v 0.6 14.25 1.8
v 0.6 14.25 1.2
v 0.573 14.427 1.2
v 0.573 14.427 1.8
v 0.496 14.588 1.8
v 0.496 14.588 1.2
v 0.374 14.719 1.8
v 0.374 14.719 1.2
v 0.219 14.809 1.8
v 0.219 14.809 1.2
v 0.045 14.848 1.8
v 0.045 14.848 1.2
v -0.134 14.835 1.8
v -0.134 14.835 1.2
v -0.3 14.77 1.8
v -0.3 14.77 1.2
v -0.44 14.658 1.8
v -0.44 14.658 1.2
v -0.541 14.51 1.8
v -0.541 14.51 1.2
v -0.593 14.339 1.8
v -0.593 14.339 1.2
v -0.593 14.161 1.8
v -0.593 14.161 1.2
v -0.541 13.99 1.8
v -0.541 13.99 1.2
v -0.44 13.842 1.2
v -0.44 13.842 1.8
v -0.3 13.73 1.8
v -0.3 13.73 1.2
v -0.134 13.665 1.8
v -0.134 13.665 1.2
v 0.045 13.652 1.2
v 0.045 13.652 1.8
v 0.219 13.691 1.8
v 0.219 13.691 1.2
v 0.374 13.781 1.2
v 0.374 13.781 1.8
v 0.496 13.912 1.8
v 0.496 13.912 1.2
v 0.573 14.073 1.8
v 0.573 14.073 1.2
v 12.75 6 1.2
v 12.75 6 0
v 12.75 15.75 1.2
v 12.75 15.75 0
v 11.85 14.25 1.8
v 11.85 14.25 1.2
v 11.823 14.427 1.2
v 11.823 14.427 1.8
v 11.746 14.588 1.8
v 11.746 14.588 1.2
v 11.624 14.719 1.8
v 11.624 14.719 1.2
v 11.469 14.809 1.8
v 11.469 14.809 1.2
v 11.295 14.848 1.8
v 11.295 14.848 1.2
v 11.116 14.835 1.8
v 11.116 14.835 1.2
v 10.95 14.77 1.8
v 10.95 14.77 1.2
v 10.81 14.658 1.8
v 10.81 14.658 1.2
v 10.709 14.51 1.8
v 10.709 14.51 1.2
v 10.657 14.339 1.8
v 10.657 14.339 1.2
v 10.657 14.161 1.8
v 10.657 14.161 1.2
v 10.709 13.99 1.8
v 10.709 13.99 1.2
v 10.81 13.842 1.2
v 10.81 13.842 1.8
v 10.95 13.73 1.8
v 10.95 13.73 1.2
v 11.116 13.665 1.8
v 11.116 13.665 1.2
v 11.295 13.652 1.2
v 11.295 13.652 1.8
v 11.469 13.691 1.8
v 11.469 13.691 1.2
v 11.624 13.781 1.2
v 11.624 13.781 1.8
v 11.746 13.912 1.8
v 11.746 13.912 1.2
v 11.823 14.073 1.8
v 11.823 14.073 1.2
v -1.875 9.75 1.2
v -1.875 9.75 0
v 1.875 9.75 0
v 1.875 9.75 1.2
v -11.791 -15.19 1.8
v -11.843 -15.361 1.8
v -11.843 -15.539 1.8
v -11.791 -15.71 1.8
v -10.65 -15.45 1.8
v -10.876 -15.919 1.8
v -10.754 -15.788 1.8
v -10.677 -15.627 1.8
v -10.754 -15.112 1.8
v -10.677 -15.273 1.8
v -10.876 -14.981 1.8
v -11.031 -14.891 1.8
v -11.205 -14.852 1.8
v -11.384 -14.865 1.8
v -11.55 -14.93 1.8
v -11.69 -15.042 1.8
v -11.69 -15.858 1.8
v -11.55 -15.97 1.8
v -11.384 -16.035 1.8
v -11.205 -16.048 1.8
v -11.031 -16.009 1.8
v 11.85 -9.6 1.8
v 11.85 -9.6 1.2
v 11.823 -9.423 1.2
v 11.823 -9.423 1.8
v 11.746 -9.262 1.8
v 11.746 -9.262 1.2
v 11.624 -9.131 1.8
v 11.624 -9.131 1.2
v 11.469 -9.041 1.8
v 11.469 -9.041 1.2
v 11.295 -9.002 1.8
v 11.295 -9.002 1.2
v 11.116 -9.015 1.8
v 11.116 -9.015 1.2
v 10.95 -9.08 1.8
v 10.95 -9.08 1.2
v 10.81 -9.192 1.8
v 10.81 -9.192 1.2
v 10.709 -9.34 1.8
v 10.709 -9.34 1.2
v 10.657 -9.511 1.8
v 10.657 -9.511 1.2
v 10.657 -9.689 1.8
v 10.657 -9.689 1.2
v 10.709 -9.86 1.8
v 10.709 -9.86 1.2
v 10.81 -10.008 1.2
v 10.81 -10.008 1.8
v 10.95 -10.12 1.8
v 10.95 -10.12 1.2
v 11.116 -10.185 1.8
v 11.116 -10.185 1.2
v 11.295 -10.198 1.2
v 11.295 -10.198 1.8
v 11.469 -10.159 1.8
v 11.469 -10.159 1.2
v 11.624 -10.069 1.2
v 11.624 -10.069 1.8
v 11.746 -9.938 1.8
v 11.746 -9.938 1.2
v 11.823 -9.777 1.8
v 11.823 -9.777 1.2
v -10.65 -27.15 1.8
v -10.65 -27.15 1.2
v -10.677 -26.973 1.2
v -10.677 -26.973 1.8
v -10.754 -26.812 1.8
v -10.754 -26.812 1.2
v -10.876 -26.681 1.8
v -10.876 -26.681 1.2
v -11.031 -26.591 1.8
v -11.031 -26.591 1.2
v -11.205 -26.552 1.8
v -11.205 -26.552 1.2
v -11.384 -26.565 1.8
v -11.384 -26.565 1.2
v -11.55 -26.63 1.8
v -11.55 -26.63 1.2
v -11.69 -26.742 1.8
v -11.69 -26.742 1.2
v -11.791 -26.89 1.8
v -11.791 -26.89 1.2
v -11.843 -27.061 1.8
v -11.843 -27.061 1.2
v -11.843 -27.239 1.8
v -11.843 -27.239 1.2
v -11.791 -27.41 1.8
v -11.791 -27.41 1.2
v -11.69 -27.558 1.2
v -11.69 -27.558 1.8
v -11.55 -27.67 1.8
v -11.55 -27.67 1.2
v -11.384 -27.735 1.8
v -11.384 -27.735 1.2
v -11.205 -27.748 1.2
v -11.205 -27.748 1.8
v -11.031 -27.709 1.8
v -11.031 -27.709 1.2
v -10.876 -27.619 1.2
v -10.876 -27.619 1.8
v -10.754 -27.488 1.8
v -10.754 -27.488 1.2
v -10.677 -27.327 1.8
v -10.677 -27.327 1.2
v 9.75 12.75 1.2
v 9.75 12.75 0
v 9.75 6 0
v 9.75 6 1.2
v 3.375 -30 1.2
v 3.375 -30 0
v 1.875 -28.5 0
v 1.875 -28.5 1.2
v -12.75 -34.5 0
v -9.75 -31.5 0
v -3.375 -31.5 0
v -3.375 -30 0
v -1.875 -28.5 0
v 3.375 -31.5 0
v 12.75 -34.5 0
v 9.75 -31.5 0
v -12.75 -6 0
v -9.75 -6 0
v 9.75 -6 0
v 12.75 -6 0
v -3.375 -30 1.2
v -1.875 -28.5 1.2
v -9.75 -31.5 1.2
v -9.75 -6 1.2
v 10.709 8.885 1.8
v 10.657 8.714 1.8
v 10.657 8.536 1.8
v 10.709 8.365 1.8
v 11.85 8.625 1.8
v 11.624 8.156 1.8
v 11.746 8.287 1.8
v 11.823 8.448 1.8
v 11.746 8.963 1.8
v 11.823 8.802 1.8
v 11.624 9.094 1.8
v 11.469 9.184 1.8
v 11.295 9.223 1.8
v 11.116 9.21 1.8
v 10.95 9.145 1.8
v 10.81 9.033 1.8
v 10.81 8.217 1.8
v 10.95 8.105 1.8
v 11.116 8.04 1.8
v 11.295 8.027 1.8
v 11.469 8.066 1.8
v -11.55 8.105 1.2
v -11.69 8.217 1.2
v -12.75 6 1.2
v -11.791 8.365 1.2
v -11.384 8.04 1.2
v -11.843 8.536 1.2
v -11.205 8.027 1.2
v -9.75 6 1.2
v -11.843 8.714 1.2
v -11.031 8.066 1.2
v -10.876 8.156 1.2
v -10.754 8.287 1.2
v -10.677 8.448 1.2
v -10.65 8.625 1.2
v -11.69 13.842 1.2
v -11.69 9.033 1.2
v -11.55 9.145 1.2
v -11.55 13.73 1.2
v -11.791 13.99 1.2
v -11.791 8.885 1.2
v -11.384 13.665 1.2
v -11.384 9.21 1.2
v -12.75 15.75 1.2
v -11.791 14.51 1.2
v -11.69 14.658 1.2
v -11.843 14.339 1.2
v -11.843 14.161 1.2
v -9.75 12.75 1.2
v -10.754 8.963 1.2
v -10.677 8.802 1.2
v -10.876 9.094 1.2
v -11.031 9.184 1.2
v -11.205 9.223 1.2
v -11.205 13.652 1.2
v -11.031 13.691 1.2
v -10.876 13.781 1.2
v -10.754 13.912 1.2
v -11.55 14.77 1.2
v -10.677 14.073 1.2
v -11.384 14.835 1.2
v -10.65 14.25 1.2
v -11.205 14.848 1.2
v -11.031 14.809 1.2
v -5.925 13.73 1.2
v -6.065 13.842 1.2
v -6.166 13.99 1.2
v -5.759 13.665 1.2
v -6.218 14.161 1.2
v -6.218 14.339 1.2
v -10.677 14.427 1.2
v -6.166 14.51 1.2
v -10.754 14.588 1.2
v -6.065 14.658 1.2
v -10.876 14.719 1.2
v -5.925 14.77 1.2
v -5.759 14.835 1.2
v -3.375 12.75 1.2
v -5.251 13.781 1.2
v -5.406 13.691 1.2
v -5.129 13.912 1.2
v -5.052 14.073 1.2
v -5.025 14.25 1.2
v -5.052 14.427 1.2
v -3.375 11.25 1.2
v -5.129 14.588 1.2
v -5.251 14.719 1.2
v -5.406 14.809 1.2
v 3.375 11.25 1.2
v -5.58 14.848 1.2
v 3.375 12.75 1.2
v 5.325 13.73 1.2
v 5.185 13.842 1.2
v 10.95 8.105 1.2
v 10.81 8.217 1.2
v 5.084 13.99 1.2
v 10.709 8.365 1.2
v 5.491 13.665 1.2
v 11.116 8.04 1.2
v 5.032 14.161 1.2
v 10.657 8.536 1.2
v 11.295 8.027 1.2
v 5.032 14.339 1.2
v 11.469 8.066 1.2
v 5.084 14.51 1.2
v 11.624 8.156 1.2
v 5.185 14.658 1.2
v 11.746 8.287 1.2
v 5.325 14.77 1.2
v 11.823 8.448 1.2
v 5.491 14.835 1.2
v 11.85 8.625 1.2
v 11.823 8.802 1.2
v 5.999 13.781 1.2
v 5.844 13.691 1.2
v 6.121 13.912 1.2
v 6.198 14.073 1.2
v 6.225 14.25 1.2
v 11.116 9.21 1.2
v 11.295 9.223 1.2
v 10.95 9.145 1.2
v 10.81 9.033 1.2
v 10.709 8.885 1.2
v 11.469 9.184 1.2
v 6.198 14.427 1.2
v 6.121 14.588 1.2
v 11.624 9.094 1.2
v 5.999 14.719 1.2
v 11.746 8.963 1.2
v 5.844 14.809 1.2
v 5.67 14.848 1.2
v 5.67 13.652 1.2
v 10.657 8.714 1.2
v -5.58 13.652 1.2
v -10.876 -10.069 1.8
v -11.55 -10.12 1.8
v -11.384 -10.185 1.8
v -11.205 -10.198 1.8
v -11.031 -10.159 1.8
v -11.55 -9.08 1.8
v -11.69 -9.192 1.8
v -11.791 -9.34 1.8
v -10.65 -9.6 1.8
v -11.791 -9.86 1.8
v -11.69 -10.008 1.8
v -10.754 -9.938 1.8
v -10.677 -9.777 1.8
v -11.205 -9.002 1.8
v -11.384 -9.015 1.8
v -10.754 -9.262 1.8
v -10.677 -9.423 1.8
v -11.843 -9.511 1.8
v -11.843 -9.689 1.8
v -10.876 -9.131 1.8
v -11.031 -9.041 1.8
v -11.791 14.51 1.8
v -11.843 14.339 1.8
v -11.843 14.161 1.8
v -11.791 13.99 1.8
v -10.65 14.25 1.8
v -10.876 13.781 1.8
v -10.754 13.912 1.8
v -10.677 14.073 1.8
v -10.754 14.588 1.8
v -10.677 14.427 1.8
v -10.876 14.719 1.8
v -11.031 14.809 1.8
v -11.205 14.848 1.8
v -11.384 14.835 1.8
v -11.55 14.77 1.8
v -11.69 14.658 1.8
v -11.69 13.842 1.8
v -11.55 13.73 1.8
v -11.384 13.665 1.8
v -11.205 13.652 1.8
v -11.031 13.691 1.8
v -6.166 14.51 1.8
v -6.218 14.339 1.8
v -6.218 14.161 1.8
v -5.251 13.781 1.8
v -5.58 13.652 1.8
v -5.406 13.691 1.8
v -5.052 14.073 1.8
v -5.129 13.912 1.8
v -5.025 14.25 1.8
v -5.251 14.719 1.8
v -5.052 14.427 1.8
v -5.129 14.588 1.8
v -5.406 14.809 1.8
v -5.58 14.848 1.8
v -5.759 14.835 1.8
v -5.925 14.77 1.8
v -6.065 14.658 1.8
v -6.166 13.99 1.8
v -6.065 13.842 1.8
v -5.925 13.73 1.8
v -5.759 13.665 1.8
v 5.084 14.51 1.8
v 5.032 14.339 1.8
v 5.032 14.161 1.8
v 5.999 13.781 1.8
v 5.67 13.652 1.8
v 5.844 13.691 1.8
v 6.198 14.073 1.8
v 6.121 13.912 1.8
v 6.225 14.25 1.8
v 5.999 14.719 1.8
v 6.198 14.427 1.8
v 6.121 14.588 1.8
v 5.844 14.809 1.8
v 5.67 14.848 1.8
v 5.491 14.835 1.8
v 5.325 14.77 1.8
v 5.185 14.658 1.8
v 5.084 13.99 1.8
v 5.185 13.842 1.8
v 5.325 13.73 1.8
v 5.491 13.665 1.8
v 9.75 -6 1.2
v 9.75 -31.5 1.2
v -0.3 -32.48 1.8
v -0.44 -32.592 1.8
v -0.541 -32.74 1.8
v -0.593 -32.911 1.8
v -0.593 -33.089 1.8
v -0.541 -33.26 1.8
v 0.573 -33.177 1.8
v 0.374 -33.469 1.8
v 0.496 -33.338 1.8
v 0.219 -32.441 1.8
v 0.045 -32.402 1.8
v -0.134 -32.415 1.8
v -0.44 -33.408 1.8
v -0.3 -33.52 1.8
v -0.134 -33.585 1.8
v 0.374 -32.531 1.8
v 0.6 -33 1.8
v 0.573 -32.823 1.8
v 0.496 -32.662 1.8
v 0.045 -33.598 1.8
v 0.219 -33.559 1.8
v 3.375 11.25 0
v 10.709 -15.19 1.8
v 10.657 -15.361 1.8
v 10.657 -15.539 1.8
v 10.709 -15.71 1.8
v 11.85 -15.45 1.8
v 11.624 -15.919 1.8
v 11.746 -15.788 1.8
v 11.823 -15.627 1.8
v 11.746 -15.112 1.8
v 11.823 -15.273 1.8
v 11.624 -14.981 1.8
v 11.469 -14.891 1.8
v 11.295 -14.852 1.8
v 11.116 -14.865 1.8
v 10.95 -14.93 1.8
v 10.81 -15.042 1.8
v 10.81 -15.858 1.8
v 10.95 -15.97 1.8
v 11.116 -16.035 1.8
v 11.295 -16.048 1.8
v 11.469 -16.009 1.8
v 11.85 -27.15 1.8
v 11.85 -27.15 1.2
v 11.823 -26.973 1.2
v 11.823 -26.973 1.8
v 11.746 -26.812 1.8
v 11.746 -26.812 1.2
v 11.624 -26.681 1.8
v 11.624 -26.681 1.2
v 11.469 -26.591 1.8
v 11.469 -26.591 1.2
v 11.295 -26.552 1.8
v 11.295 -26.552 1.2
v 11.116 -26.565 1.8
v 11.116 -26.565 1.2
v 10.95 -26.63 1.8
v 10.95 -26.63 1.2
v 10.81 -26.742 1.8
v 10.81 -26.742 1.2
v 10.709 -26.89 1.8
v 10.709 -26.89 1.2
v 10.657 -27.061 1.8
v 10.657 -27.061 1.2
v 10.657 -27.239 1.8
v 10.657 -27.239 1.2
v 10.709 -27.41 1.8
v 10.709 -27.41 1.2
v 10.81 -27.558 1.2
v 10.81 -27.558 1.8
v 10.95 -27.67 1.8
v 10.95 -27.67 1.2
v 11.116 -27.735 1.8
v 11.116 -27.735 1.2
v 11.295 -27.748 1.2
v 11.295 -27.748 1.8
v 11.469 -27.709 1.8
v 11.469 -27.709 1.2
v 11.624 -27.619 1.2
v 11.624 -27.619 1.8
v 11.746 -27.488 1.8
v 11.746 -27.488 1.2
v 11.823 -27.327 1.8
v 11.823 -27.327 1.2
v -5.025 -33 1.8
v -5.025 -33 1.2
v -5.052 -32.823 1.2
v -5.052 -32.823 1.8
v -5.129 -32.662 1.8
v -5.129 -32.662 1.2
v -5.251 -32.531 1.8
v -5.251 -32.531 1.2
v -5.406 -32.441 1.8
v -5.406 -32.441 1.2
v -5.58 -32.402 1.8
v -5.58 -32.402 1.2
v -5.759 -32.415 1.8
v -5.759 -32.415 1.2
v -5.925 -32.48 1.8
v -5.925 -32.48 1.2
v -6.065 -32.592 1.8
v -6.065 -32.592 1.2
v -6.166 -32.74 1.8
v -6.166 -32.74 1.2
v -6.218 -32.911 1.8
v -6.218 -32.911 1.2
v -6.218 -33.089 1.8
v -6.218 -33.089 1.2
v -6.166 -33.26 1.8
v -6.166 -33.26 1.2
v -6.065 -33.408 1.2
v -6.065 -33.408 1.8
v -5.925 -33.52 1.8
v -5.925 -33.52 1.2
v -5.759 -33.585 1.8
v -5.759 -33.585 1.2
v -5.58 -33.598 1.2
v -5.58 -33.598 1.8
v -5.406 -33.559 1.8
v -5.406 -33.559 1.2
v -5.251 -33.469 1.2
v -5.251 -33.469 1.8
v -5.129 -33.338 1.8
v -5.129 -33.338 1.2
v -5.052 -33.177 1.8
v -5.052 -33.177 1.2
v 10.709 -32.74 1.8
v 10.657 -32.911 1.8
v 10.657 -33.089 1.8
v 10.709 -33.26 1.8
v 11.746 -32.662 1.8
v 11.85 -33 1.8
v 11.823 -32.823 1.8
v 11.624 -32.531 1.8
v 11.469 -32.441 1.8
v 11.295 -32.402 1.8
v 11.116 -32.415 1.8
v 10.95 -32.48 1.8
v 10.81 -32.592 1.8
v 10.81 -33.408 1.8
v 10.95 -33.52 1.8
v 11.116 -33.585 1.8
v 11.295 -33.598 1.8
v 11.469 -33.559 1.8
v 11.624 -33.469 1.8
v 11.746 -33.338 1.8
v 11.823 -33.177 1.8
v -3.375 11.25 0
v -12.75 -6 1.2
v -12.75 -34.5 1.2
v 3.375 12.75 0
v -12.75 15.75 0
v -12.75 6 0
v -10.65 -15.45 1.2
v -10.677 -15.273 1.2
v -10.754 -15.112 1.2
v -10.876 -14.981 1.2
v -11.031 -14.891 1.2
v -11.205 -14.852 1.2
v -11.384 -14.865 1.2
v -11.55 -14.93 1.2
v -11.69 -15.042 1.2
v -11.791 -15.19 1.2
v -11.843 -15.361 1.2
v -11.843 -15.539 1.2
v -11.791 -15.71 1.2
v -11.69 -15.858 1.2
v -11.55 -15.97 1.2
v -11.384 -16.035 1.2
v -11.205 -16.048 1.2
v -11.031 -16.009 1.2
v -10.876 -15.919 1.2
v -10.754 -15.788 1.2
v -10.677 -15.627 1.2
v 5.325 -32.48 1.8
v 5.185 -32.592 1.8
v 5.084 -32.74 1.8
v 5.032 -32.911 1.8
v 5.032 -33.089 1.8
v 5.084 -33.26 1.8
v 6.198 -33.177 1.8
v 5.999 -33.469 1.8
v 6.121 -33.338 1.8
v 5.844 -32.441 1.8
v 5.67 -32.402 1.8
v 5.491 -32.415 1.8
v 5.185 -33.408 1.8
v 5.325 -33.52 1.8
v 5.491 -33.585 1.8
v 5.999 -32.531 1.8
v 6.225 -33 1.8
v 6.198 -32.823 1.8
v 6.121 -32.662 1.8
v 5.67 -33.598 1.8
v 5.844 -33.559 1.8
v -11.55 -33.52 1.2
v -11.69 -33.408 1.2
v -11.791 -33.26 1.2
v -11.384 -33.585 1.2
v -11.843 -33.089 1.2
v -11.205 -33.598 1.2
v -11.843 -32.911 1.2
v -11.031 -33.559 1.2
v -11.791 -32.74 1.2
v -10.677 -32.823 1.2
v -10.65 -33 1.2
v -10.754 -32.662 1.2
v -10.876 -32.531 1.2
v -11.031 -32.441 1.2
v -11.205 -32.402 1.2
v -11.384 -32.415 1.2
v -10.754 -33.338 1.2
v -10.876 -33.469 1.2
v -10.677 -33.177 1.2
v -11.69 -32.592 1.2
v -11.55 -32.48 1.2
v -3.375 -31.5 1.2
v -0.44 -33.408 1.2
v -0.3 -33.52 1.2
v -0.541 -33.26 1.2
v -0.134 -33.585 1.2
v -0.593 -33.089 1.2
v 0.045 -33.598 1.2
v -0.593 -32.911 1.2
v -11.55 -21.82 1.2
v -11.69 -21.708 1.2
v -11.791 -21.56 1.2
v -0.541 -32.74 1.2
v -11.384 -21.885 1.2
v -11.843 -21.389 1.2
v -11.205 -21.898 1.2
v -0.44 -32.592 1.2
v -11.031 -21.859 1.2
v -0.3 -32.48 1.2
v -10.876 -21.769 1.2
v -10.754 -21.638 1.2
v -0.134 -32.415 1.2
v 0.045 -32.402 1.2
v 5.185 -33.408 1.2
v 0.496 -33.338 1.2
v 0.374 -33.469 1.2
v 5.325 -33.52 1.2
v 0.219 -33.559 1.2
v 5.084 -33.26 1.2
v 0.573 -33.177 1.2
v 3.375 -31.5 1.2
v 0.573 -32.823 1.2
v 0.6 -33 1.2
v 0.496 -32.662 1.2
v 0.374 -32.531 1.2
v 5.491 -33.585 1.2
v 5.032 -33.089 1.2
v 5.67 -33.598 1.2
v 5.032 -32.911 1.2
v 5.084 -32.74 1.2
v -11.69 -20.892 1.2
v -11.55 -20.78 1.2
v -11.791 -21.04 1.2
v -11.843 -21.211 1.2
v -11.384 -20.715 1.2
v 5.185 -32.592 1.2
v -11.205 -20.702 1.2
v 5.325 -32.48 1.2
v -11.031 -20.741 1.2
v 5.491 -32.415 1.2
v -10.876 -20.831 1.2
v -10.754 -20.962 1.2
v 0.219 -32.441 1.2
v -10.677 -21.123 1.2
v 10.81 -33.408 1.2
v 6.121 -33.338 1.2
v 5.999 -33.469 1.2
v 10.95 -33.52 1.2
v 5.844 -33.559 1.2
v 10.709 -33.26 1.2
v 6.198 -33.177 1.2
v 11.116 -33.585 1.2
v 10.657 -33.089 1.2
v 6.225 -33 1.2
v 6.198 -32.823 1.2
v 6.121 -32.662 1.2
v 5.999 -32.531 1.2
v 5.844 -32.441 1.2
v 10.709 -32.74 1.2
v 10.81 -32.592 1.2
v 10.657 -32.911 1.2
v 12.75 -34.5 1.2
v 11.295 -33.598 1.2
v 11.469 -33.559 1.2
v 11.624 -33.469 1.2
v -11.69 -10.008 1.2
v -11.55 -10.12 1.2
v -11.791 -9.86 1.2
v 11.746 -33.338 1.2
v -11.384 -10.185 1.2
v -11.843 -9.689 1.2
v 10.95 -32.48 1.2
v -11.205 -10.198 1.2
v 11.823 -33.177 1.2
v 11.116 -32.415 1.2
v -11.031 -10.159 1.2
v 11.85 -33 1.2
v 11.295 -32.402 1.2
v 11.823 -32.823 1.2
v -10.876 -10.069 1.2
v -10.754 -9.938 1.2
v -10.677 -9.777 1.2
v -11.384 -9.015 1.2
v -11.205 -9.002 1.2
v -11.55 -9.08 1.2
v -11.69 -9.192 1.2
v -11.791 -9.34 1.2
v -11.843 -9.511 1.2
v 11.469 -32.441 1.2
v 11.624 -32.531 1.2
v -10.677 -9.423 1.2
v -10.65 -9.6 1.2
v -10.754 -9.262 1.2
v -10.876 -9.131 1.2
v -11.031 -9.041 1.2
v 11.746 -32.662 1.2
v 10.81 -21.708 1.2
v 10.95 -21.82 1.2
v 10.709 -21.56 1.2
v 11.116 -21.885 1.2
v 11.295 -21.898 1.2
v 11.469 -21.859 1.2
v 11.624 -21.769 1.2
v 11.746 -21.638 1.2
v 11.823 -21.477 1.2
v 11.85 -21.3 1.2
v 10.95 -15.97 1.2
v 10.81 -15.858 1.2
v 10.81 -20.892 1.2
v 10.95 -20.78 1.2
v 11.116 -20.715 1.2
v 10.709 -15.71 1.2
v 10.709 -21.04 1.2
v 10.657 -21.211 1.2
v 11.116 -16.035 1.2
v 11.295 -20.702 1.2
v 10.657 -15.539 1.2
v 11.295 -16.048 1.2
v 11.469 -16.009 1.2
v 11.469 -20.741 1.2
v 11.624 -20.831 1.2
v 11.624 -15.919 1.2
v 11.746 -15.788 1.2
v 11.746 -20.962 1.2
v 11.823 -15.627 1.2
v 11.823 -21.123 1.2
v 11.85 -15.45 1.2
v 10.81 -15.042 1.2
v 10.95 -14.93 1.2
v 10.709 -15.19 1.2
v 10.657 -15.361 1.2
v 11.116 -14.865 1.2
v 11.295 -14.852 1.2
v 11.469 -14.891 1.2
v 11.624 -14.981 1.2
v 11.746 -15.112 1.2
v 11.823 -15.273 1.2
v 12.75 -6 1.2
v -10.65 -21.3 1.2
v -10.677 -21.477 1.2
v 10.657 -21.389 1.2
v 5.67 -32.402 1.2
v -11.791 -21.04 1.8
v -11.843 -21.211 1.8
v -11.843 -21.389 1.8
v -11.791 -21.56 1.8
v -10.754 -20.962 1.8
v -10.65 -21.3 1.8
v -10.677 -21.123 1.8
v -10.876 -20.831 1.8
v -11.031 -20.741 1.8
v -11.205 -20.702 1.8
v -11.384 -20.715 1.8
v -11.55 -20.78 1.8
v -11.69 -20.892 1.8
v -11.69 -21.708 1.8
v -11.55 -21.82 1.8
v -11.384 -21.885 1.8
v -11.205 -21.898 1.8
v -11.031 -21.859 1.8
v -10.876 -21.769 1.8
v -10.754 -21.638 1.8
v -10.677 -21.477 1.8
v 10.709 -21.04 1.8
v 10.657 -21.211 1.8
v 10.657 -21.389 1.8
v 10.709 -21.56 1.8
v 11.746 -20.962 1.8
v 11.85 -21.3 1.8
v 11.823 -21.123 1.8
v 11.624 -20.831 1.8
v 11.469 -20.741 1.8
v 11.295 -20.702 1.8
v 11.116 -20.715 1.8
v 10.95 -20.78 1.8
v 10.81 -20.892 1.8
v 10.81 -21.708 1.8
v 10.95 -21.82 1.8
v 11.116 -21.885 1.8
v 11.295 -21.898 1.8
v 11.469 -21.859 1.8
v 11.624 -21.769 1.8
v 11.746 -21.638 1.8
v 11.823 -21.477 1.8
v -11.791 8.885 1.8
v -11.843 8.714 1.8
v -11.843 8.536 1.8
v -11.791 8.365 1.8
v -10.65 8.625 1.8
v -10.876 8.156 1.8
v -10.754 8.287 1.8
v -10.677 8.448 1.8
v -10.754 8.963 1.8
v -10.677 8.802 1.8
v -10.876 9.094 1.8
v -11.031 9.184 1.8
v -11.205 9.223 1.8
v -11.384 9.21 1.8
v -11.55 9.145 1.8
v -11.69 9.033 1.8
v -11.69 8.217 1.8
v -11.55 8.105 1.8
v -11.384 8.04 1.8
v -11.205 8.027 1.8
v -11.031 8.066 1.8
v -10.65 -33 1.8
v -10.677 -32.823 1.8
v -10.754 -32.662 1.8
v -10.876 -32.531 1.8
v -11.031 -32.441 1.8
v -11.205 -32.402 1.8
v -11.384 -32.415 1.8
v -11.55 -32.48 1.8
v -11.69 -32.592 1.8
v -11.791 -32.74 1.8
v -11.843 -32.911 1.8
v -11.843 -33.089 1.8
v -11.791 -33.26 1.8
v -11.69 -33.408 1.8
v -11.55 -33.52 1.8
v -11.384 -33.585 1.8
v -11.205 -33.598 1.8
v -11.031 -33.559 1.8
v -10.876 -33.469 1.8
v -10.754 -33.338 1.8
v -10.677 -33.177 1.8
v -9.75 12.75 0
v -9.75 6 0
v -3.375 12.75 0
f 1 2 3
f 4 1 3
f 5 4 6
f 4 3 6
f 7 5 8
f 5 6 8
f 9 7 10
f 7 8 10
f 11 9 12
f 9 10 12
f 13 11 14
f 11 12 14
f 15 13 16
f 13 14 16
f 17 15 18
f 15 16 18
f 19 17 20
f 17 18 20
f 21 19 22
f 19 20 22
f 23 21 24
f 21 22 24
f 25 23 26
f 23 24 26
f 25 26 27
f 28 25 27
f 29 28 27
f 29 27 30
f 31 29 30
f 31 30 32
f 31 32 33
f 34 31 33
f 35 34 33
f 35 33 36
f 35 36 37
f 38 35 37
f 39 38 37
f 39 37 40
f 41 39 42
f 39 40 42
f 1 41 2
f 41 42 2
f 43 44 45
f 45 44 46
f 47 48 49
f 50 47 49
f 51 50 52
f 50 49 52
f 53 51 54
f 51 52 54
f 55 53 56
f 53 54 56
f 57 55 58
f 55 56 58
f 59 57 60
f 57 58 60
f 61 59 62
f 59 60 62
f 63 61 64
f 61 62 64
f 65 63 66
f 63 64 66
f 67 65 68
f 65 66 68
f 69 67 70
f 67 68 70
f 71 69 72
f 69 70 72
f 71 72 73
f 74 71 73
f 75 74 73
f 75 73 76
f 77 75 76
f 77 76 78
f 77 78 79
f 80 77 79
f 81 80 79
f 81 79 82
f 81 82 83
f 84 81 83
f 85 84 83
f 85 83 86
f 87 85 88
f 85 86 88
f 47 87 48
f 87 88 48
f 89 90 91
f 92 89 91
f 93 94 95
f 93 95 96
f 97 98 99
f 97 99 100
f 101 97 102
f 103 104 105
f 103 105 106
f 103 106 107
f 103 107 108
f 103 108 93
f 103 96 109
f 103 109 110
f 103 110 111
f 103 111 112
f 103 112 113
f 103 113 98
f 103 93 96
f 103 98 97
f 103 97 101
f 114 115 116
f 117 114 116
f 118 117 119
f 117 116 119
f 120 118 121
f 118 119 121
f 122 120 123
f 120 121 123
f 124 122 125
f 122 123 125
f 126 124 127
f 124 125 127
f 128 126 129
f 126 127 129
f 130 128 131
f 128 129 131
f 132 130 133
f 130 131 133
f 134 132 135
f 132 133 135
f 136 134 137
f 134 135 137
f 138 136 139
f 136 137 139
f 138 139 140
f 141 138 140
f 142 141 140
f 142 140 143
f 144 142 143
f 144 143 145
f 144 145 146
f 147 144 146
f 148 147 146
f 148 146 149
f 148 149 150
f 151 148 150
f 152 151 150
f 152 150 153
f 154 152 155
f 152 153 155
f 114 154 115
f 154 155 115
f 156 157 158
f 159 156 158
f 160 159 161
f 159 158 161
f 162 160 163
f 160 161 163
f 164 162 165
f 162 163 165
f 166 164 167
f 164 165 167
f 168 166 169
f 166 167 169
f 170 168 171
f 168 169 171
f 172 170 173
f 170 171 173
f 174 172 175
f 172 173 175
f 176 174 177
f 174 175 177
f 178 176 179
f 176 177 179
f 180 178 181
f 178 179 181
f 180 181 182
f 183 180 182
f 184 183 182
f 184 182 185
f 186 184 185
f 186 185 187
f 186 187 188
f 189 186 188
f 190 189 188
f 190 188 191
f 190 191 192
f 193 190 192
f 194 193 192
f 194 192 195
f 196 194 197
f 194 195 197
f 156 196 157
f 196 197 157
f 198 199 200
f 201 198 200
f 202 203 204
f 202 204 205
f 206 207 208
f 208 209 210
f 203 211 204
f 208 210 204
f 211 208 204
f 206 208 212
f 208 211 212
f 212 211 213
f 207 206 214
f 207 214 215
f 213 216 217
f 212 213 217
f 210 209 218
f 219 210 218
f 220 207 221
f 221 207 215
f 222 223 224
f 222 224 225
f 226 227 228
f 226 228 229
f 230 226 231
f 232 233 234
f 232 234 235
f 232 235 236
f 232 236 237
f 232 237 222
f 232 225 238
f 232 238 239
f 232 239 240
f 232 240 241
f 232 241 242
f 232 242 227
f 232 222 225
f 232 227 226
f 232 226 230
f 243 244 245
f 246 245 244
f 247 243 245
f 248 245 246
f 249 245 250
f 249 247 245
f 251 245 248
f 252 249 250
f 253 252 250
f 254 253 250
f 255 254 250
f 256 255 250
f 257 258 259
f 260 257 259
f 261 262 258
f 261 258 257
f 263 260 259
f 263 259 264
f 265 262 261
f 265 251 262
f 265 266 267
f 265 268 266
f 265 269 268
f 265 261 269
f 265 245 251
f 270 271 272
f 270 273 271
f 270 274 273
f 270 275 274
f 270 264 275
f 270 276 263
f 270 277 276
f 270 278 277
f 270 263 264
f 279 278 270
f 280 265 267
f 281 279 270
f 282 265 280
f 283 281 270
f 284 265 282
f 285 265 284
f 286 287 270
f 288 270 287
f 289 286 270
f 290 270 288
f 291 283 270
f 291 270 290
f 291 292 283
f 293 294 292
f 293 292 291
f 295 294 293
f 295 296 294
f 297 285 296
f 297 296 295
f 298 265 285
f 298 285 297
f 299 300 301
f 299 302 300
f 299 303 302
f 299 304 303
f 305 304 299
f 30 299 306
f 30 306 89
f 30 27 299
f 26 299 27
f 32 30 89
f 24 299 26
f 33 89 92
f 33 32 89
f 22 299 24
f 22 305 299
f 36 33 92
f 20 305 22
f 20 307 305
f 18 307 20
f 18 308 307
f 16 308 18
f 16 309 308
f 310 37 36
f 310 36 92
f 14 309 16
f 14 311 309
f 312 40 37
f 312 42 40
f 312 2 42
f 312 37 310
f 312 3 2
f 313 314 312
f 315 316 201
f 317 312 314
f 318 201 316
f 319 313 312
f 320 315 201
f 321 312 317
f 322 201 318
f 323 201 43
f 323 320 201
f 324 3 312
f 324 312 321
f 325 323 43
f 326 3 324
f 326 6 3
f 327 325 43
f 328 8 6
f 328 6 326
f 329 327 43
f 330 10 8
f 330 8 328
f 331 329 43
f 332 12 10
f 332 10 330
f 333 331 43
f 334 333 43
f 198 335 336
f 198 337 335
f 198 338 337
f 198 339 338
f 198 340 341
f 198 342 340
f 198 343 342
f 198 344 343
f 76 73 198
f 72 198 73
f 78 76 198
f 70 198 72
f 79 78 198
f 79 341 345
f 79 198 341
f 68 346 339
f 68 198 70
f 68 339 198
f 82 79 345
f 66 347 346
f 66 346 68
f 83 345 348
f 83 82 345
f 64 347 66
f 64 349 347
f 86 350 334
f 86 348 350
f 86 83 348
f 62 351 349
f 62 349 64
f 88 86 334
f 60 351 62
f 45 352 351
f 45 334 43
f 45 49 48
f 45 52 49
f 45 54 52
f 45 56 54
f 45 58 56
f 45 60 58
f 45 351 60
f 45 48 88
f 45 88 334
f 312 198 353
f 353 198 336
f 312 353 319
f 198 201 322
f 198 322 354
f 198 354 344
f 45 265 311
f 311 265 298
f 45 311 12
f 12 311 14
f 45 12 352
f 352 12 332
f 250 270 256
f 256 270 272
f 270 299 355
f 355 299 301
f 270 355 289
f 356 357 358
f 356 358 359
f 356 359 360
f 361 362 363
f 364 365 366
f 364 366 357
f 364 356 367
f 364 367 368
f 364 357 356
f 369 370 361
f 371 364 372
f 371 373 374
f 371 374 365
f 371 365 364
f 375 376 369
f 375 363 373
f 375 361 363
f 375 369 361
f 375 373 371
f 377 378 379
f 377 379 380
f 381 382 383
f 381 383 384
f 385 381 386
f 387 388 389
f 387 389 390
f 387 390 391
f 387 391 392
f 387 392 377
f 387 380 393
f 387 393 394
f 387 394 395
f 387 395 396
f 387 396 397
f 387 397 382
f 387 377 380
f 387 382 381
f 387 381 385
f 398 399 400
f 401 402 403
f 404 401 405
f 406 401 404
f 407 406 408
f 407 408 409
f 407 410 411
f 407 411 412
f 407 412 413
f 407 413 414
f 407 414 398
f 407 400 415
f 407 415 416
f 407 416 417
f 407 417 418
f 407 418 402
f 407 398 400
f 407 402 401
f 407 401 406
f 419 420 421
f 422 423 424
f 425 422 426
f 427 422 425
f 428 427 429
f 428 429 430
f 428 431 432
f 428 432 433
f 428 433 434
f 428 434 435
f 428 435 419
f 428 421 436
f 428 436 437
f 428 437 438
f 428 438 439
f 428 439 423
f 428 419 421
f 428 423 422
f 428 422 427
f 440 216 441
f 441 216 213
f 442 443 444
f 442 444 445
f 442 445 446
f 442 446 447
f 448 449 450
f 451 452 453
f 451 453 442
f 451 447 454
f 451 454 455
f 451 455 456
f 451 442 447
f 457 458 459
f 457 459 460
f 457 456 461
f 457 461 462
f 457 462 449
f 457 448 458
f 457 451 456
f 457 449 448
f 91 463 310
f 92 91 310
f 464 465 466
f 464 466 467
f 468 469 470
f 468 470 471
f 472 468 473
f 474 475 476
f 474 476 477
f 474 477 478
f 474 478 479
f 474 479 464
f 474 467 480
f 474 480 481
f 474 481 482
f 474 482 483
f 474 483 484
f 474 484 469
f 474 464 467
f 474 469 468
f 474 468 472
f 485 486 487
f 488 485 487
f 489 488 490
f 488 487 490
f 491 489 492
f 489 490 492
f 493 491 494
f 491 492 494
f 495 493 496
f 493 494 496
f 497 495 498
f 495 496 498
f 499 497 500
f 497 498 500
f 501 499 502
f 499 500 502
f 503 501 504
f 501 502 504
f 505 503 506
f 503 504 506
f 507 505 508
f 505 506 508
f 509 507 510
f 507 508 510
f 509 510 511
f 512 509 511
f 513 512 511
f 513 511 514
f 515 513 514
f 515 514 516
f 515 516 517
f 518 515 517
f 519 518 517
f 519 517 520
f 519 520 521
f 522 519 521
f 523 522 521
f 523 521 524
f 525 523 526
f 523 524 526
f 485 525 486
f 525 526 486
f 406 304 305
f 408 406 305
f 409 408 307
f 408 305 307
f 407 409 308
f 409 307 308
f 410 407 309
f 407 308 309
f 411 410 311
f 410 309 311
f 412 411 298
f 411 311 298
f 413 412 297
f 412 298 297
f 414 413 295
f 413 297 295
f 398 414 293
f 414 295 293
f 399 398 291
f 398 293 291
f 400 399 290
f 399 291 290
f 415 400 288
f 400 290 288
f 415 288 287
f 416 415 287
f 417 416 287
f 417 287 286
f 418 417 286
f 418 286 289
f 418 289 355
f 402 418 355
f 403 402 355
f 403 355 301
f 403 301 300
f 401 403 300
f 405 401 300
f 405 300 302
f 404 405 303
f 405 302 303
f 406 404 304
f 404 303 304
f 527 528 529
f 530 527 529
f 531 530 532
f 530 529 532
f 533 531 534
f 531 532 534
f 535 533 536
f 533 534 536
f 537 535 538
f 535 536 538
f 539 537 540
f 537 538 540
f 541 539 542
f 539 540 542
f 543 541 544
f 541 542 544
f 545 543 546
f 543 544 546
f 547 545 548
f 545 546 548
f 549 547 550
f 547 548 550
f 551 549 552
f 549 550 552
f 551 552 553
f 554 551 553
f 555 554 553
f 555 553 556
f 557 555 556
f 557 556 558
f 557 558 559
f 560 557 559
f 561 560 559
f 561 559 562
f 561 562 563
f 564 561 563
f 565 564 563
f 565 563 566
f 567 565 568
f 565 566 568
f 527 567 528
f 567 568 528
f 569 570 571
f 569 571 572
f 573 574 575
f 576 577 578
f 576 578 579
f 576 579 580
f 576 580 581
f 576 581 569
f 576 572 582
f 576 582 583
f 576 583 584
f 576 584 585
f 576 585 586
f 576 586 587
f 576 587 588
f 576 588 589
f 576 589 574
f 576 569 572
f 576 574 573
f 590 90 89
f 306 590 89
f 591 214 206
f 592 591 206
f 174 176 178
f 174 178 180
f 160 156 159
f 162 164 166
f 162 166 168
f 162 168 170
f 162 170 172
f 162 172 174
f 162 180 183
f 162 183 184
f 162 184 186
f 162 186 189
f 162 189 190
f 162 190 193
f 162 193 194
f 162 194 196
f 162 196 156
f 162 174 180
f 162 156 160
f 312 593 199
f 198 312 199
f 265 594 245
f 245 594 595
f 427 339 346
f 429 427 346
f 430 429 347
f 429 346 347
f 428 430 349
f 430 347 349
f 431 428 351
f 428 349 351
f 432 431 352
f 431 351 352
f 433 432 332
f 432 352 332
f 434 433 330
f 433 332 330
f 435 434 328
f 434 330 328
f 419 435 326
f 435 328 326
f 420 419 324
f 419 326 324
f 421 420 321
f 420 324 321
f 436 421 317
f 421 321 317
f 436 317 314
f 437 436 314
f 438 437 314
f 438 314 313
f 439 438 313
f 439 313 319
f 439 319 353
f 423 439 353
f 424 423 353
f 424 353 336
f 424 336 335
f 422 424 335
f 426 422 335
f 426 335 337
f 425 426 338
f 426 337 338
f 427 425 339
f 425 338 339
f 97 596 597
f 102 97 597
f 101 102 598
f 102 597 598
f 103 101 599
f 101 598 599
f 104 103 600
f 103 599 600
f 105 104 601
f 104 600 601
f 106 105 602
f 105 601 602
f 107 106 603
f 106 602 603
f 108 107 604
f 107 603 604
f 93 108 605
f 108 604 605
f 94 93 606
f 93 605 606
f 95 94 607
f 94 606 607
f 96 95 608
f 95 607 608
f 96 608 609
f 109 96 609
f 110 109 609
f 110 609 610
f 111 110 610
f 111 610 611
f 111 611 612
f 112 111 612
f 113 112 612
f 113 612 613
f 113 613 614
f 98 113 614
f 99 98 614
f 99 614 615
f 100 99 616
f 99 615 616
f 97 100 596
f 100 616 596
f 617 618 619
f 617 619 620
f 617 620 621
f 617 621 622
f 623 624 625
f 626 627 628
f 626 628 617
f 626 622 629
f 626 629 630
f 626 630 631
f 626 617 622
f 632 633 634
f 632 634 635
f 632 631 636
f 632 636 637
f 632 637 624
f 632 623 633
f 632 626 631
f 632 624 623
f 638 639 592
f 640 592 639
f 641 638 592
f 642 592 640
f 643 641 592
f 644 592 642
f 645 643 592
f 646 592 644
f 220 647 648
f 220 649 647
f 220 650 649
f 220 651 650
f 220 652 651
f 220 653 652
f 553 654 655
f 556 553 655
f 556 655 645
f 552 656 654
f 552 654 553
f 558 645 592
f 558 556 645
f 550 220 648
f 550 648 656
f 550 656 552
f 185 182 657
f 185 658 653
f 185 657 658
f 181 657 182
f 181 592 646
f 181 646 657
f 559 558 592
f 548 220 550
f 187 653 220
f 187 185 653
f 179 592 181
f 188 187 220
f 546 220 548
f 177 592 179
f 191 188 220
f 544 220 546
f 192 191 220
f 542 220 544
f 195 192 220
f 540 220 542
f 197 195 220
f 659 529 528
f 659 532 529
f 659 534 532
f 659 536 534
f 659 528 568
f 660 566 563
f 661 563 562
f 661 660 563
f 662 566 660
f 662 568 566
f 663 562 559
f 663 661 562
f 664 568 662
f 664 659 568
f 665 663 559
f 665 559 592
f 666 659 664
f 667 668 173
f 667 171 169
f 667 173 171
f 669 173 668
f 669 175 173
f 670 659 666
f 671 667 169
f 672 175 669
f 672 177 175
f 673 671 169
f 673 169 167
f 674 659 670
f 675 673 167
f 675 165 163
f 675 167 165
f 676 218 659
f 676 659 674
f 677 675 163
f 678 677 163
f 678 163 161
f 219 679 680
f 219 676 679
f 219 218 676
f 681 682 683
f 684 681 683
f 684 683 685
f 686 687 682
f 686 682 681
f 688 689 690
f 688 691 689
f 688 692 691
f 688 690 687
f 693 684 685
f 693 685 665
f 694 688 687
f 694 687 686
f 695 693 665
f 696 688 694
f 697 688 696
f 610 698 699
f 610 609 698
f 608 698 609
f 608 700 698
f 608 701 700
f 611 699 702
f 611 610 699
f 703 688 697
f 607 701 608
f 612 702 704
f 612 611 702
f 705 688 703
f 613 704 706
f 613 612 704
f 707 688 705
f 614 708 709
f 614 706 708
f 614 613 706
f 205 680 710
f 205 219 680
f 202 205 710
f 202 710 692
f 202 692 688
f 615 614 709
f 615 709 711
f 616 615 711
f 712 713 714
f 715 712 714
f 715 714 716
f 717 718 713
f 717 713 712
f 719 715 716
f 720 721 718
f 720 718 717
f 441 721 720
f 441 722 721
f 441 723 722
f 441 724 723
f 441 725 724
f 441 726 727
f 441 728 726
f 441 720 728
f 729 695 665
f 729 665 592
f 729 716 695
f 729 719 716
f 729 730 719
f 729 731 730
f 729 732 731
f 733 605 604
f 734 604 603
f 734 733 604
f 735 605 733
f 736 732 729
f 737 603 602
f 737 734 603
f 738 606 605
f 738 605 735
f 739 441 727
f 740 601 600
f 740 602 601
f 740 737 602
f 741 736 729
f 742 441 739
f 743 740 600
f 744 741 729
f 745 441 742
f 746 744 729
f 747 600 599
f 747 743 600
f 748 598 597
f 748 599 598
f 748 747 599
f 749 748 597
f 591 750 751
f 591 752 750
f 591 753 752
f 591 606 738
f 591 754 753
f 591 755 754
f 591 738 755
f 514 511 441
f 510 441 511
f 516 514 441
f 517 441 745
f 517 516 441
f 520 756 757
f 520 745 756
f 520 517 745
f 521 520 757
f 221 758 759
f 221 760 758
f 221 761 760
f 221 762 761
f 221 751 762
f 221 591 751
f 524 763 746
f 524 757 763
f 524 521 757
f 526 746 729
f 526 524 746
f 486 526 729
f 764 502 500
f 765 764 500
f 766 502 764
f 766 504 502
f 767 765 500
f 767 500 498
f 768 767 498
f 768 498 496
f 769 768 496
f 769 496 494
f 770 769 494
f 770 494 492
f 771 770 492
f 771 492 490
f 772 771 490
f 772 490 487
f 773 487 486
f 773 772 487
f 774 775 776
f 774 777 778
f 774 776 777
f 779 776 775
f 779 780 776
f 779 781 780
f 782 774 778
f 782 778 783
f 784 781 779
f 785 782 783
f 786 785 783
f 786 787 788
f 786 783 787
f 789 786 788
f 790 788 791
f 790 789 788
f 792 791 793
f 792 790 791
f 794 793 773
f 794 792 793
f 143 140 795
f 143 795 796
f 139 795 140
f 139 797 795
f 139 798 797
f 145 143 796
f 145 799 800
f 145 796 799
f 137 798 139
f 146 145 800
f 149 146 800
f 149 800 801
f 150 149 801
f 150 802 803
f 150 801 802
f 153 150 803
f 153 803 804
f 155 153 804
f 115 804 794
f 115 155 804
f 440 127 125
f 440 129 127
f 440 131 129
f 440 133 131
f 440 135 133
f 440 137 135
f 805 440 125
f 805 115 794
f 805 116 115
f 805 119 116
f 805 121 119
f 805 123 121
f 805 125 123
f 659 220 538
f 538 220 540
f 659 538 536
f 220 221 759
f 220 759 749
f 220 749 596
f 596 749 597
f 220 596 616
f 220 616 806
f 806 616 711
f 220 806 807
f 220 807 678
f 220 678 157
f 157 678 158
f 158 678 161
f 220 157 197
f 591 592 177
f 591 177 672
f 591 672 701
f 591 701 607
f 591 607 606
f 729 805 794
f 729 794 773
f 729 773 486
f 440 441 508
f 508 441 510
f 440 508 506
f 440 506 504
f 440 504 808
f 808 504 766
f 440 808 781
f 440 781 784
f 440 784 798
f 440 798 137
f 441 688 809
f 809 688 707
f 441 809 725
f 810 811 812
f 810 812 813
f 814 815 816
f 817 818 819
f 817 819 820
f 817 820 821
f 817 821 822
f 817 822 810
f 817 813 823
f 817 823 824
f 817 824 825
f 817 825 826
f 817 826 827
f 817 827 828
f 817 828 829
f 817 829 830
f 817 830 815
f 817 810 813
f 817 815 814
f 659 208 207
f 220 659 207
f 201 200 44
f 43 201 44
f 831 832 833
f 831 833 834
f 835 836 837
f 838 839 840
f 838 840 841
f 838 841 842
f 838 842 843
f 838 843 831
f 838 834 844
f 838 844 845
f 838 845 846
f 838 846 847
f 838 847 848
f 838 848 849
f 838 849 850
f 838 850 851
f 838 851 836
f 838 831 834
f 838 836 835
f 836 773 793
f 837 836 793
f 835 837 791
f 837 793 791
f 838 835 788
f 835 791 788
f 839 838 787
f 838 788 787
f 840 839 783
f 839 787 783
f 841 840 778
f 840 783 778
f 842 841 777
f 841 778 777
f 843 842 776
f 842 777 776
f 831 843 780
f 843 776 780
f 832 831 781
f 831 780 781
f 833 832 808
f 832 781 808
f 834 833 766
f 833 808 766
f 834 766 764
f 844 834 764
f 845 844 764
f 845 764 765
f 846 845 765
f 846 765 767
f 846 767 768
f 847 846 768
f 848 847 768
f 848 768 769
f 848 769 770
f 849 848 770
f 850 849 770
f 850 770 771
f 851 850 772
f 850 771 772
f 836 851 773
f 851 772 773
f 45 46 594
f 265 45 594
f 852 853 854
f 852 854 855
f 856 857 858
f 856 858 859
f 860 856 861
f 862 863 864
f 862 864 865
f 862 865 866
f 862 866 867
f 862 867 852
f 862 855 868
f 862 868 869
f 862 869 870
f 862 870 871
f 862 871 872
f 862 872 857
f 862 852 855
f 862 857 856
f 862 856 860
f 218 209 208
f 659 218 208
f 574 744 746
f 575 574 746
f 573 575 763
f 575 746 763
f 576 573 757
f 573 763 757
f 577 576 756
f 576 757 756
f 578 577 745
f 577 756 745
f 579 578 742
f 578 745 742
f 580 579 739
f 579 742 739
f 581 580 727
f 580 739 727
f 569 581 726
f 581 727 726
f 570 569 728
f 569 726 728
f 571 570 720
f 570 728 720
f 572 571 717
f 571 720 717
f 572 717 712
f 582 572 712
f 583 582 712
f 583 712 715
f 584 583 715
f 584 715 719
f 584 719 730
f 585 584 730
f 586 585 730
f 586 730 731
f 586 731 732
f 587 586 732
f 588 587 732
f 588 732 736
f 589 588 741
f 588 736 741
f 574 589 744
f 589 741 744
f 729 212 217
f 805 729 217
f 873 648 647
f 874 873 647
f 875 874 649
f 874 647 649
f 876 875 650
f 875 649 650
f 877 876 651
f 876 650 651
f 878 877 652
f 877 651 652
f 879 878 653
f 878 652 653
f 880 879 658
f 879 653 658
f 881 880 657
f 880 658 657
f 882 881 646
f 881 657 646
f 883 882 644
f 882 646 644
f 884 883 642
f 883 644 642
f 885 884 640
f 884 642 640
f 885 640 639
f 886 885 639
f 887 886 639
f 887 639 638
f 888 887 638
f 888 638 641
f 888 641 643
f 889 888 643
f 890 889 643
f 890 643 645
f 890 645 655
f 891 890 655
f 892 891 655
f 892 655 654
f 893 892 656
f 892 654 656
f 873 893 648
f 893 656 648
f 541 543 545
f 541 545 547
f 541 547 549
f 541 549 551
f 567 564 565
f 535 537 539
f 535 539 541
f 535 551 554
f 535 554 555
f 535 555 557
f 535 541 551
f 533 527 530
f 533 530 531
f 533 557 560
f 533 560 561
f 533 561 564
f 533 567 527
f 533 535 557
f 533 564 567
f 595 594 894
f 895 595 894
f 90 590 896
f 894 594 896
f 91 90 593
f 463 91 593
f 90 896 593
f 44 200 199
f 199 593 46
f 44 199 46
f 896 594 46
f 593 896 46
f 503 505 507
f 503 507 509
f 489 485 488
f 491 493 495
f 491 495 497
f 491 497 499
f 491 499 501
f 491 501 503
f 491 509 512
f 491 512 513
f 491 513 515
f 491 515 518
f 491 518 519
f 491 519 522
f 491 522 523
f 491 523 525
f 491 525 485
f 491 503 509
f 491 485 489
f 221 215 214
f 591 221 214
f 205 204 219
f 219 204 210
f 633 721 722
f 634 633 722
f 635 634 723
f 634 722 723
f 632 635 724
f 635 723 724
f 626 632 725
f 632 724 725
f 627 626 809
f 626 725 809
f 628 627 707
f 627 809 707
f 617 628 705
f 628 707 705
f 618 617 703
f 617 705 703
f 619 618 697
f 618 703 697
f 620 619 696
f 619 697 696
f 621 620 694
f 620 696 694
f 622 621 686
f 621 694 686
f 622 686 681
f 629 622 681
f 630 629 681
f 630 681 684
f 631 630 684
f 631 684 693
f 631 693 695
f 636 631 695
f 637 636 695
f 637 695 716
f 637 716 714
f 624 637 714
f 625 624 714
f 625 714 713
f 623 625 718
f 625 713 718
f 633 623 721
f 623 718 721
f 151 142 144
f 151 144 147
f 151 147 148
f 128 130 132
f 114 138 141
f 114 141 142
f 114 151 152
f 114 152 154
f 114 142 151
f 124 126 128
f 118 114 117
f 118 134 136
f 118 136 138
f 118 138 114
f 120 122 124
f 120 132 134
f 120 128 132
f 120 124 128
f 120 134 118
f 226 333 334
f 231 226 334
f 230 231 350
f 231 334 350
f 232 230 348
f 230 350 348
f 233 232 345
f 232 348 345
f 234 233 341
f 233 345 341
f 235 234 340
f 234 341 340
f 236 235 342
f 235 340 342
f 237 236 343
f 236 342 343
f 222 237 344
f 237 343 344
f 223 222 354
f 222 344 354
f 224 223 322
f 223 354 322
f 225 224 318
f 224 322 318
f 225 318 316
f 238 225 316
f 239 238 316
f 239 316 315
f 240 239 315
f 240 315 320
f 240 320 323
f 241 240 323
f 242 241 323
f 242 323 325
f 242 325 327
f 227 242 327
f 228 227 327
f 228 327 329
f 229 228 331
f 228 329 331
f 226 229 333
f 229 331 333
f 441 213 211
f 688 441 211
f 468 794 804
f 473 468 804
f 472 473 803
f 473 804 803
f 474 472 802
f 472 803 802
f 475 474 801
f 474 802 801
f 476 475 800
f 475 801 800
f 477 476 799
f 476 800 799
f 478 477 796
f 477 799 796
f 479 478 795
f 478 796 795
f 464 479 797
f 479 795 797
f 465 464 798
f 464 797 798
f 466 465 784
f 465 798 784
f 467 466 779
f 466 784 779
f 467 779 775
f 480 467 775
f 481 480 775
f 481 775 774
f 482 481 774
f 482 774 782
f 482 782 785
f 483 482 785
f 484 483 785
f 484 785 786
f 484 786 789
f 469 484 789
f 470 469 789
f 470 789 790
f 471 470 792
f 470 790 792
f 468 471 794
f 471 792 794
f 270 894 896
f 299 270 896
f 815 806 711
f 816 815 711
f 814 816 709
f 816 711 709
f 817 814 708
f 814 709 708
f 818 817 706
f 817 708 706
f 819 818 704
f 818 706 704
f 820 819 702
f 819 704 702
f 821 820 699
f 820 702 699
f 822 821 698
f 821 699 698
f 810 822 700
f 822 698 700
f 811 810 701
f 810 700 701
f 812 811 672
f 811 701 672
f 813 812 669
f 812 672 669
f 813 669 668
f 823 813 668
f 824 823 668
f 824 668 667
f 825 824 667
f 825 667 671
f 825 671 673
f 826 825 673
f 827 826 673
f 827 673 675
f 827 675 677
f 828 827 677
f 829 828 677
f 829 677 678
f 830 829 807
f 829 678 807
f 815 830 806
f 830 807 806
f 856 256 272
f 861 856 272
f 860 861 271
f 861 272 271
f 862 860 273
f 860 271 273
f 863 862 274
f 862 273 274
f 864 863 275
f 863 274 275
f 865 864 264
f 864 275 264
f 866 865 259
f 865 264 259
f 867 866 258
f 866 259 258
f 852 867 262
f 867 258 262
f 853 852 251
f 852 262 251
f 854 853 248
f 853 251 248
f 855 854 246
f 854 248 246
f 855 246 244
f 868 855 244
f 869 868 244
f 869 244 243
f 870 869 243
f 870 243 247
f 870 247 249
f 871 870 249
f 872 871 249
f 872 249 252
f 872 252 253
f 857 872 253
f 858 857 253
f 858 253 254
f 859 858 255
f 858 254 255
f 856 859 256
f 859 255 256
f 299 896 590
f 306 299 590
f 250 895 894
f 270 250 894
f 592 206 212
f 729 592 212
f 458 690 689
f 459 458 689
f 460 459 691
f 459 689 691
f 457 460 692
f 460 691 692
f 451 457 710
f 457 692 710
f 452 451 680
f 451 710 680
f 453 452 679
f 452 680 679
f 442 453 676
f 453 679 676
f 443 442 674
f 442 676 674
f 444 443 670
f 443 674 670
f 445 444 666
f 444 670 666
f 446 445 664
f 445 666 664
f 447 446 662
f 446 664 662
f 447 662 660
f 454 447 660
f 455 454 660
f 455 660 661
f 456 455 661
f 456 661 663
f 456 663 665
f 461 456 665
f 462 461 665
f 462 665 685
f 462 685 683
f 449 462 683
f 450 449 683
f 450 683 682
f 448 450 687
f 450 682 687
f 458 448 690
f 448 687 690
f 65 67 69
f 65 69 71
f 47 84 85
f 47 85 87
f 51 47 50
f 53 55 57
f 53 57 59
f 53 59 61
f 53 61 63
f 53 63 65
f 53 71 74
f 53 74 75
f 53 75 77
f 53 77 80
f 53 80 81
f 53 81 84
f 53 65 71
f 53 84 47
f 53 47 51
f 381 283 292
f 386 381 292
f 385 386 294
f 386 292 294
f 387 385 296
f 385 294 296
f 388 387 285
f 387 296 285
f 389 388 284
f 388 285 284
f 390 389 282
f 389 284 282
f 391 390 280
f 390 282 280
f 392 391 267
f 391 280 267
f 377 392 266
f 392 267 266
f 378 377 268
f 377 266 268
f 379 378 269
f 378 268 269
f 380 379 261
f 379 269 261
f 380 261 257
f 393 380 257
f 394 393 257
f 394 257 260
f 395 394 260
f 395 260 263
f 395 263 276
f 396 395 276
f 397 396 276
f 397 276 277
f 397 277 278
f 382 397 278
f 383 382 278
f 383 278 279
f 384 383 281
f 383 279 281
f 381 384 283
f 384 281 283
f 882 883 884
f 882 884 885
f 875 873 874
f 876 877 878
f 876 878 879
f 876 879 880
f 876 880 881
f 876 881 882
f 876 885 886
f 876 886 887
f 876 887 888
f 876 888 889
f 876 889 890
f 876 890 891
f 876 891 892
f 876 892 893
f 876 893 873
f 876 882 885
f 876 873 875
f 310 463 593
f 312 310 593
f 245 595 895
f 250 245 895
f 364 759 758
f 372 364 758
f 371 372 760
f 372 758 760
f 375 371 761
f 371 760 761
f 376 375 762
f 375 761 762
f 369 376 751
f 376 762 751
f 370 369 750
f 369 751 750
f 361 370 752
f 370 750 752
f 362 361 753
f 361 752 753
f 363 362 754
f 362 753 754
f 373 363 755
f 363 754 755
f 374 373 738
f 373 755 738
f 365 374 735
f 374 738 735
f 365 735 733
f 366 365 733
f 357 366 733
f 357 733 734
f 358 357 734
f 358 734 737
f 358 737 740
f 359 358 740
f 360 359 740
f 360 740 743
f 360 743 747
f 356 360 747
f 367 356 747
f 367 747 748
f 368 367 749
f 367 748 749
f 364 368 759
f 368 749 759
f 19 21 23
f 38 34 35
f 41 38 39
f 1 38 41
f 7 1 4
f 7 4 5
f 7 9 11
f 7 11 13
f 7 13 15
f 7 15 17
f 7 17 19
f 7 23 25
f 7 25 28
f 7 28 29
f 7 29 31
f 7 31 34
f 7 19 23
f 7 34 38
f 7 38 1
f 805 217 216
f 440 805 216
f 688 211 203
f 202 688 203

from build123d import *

# Parameters (mm, degrees)
F2_DEPTH  = 1.2
F3_R      = 0.6
F4_DEPTH  = 0.6
F5_SIZE   = 1.5
F5_2_SIZE = 1.5


with BuildPart() as f2:
    # F1 (on Top) → F2 (new body)
    with BuildSketch(Plane.XY):
        Polygon((12.75, 15.75), (-12.75, 15.75), (-12.75, 6), (-9.75, 6), (-9.75, 12.75), (-3.375, 12.75), (-3.375, 9.75), (3.375, 9.75), (3.375, 12.75), (9.75, 12.75), (9.75, 6), (12.75, 6), align=None)
    extrude(amount=F2_DEPTH)

    # F3 (on face) → F4 (join)
    with BuildSketch(Plane.XY.offset(1.2)):
        with Locations((-11.25, 14.25)):
            Circle(F3_R)
        with Locations((-5.625, 14.25)):
            Circle(F3_R)
        with Locations((0, 14.25)):
            Circle(F3_R)
        with Locations((5.625, 14.25)):
            Circle(F3_R)
        with Locations((11.25, 14.25)):
            Circle(F3_R)
        with Locations((-11.25, 8.625)):
            Circle(F3_R)
        with Locations((11.25, 8.625)):
            Circle(F3_R)
    extrude(amount=F4_DEPTH)

    # F5
    f5_edges = [f2.edges().sort_by_distance(p)[0] for p in [
        (-3.375, 9.75, 0.6),
        (3.375, 9.75, 0.6),
    ]]
    chamfer(f5_edges, length=F5_SIZE)


with BuildPart() as f2b:
    # F1 (on Top) → F2, piece 2 (new body)
    with BuildSketch(Plane.XY):
        Polygon((-12.75, -6), (-12.75, -34.5), (12.75, -34.5), (12.75, -6), (9.75, -6), (9.75, -31.5), (3.375, -31.5), (3.375, -28.5), (-3.375, -28.5), (-3.375, -31.5), (-9.75, -31.5), (-9.75, -6), align=None)
    extrude(amount=F2_DEPTH)

    # F3 (on face) → F4, piece 2 (join)
    with BuildSketch(Plane.XY.offset(1.2)):
        with Locations((0, -33)):
            Circle(F3_R)
        with Locations((5.625, -33)):
            Circle(F3_R)
        with Locations((11.25, -33)):
            Circle(F3_R)
        with Locations((-5.625, -33)):
            Circle(F3_R)
        with Locations((-11.25, -33)):
            Circle(F3_R)
        with Locations((-11.25, -27.15)):
            Circle(F3_R)
        with Locations((-11.25, -21.3)):
            Circle(F3_R)
        with Locations((-11.25, -15.45)):
            Circle(F3_R)
        with Locations((-11.25, -9.6)):
            Circle(F3_R)
        with Locations((11.25, -27.15)):
            Circle(F3_R)
        with Locations((11.25, -21.3)):
            Circle(F3_R)
        with Locations((11.25, -15.45)):
            Circle(F3_R)
        with Locations((11.25, -9.6)):
            Circle(F3_R)
    extrude(amount=F4_DEPTH)

    # F5#2
    f5_2_edges = [f2b.edges().sort_by_distance(p)[0] for p in [
        (3.375, -28.5, 0.6),
        (-3.375, -28.5, 0.6),
    ]]
    chamfer(f5_2_edges, length=F5_2_SIZE)


solid = Compound([f2.part, f2b.part])
